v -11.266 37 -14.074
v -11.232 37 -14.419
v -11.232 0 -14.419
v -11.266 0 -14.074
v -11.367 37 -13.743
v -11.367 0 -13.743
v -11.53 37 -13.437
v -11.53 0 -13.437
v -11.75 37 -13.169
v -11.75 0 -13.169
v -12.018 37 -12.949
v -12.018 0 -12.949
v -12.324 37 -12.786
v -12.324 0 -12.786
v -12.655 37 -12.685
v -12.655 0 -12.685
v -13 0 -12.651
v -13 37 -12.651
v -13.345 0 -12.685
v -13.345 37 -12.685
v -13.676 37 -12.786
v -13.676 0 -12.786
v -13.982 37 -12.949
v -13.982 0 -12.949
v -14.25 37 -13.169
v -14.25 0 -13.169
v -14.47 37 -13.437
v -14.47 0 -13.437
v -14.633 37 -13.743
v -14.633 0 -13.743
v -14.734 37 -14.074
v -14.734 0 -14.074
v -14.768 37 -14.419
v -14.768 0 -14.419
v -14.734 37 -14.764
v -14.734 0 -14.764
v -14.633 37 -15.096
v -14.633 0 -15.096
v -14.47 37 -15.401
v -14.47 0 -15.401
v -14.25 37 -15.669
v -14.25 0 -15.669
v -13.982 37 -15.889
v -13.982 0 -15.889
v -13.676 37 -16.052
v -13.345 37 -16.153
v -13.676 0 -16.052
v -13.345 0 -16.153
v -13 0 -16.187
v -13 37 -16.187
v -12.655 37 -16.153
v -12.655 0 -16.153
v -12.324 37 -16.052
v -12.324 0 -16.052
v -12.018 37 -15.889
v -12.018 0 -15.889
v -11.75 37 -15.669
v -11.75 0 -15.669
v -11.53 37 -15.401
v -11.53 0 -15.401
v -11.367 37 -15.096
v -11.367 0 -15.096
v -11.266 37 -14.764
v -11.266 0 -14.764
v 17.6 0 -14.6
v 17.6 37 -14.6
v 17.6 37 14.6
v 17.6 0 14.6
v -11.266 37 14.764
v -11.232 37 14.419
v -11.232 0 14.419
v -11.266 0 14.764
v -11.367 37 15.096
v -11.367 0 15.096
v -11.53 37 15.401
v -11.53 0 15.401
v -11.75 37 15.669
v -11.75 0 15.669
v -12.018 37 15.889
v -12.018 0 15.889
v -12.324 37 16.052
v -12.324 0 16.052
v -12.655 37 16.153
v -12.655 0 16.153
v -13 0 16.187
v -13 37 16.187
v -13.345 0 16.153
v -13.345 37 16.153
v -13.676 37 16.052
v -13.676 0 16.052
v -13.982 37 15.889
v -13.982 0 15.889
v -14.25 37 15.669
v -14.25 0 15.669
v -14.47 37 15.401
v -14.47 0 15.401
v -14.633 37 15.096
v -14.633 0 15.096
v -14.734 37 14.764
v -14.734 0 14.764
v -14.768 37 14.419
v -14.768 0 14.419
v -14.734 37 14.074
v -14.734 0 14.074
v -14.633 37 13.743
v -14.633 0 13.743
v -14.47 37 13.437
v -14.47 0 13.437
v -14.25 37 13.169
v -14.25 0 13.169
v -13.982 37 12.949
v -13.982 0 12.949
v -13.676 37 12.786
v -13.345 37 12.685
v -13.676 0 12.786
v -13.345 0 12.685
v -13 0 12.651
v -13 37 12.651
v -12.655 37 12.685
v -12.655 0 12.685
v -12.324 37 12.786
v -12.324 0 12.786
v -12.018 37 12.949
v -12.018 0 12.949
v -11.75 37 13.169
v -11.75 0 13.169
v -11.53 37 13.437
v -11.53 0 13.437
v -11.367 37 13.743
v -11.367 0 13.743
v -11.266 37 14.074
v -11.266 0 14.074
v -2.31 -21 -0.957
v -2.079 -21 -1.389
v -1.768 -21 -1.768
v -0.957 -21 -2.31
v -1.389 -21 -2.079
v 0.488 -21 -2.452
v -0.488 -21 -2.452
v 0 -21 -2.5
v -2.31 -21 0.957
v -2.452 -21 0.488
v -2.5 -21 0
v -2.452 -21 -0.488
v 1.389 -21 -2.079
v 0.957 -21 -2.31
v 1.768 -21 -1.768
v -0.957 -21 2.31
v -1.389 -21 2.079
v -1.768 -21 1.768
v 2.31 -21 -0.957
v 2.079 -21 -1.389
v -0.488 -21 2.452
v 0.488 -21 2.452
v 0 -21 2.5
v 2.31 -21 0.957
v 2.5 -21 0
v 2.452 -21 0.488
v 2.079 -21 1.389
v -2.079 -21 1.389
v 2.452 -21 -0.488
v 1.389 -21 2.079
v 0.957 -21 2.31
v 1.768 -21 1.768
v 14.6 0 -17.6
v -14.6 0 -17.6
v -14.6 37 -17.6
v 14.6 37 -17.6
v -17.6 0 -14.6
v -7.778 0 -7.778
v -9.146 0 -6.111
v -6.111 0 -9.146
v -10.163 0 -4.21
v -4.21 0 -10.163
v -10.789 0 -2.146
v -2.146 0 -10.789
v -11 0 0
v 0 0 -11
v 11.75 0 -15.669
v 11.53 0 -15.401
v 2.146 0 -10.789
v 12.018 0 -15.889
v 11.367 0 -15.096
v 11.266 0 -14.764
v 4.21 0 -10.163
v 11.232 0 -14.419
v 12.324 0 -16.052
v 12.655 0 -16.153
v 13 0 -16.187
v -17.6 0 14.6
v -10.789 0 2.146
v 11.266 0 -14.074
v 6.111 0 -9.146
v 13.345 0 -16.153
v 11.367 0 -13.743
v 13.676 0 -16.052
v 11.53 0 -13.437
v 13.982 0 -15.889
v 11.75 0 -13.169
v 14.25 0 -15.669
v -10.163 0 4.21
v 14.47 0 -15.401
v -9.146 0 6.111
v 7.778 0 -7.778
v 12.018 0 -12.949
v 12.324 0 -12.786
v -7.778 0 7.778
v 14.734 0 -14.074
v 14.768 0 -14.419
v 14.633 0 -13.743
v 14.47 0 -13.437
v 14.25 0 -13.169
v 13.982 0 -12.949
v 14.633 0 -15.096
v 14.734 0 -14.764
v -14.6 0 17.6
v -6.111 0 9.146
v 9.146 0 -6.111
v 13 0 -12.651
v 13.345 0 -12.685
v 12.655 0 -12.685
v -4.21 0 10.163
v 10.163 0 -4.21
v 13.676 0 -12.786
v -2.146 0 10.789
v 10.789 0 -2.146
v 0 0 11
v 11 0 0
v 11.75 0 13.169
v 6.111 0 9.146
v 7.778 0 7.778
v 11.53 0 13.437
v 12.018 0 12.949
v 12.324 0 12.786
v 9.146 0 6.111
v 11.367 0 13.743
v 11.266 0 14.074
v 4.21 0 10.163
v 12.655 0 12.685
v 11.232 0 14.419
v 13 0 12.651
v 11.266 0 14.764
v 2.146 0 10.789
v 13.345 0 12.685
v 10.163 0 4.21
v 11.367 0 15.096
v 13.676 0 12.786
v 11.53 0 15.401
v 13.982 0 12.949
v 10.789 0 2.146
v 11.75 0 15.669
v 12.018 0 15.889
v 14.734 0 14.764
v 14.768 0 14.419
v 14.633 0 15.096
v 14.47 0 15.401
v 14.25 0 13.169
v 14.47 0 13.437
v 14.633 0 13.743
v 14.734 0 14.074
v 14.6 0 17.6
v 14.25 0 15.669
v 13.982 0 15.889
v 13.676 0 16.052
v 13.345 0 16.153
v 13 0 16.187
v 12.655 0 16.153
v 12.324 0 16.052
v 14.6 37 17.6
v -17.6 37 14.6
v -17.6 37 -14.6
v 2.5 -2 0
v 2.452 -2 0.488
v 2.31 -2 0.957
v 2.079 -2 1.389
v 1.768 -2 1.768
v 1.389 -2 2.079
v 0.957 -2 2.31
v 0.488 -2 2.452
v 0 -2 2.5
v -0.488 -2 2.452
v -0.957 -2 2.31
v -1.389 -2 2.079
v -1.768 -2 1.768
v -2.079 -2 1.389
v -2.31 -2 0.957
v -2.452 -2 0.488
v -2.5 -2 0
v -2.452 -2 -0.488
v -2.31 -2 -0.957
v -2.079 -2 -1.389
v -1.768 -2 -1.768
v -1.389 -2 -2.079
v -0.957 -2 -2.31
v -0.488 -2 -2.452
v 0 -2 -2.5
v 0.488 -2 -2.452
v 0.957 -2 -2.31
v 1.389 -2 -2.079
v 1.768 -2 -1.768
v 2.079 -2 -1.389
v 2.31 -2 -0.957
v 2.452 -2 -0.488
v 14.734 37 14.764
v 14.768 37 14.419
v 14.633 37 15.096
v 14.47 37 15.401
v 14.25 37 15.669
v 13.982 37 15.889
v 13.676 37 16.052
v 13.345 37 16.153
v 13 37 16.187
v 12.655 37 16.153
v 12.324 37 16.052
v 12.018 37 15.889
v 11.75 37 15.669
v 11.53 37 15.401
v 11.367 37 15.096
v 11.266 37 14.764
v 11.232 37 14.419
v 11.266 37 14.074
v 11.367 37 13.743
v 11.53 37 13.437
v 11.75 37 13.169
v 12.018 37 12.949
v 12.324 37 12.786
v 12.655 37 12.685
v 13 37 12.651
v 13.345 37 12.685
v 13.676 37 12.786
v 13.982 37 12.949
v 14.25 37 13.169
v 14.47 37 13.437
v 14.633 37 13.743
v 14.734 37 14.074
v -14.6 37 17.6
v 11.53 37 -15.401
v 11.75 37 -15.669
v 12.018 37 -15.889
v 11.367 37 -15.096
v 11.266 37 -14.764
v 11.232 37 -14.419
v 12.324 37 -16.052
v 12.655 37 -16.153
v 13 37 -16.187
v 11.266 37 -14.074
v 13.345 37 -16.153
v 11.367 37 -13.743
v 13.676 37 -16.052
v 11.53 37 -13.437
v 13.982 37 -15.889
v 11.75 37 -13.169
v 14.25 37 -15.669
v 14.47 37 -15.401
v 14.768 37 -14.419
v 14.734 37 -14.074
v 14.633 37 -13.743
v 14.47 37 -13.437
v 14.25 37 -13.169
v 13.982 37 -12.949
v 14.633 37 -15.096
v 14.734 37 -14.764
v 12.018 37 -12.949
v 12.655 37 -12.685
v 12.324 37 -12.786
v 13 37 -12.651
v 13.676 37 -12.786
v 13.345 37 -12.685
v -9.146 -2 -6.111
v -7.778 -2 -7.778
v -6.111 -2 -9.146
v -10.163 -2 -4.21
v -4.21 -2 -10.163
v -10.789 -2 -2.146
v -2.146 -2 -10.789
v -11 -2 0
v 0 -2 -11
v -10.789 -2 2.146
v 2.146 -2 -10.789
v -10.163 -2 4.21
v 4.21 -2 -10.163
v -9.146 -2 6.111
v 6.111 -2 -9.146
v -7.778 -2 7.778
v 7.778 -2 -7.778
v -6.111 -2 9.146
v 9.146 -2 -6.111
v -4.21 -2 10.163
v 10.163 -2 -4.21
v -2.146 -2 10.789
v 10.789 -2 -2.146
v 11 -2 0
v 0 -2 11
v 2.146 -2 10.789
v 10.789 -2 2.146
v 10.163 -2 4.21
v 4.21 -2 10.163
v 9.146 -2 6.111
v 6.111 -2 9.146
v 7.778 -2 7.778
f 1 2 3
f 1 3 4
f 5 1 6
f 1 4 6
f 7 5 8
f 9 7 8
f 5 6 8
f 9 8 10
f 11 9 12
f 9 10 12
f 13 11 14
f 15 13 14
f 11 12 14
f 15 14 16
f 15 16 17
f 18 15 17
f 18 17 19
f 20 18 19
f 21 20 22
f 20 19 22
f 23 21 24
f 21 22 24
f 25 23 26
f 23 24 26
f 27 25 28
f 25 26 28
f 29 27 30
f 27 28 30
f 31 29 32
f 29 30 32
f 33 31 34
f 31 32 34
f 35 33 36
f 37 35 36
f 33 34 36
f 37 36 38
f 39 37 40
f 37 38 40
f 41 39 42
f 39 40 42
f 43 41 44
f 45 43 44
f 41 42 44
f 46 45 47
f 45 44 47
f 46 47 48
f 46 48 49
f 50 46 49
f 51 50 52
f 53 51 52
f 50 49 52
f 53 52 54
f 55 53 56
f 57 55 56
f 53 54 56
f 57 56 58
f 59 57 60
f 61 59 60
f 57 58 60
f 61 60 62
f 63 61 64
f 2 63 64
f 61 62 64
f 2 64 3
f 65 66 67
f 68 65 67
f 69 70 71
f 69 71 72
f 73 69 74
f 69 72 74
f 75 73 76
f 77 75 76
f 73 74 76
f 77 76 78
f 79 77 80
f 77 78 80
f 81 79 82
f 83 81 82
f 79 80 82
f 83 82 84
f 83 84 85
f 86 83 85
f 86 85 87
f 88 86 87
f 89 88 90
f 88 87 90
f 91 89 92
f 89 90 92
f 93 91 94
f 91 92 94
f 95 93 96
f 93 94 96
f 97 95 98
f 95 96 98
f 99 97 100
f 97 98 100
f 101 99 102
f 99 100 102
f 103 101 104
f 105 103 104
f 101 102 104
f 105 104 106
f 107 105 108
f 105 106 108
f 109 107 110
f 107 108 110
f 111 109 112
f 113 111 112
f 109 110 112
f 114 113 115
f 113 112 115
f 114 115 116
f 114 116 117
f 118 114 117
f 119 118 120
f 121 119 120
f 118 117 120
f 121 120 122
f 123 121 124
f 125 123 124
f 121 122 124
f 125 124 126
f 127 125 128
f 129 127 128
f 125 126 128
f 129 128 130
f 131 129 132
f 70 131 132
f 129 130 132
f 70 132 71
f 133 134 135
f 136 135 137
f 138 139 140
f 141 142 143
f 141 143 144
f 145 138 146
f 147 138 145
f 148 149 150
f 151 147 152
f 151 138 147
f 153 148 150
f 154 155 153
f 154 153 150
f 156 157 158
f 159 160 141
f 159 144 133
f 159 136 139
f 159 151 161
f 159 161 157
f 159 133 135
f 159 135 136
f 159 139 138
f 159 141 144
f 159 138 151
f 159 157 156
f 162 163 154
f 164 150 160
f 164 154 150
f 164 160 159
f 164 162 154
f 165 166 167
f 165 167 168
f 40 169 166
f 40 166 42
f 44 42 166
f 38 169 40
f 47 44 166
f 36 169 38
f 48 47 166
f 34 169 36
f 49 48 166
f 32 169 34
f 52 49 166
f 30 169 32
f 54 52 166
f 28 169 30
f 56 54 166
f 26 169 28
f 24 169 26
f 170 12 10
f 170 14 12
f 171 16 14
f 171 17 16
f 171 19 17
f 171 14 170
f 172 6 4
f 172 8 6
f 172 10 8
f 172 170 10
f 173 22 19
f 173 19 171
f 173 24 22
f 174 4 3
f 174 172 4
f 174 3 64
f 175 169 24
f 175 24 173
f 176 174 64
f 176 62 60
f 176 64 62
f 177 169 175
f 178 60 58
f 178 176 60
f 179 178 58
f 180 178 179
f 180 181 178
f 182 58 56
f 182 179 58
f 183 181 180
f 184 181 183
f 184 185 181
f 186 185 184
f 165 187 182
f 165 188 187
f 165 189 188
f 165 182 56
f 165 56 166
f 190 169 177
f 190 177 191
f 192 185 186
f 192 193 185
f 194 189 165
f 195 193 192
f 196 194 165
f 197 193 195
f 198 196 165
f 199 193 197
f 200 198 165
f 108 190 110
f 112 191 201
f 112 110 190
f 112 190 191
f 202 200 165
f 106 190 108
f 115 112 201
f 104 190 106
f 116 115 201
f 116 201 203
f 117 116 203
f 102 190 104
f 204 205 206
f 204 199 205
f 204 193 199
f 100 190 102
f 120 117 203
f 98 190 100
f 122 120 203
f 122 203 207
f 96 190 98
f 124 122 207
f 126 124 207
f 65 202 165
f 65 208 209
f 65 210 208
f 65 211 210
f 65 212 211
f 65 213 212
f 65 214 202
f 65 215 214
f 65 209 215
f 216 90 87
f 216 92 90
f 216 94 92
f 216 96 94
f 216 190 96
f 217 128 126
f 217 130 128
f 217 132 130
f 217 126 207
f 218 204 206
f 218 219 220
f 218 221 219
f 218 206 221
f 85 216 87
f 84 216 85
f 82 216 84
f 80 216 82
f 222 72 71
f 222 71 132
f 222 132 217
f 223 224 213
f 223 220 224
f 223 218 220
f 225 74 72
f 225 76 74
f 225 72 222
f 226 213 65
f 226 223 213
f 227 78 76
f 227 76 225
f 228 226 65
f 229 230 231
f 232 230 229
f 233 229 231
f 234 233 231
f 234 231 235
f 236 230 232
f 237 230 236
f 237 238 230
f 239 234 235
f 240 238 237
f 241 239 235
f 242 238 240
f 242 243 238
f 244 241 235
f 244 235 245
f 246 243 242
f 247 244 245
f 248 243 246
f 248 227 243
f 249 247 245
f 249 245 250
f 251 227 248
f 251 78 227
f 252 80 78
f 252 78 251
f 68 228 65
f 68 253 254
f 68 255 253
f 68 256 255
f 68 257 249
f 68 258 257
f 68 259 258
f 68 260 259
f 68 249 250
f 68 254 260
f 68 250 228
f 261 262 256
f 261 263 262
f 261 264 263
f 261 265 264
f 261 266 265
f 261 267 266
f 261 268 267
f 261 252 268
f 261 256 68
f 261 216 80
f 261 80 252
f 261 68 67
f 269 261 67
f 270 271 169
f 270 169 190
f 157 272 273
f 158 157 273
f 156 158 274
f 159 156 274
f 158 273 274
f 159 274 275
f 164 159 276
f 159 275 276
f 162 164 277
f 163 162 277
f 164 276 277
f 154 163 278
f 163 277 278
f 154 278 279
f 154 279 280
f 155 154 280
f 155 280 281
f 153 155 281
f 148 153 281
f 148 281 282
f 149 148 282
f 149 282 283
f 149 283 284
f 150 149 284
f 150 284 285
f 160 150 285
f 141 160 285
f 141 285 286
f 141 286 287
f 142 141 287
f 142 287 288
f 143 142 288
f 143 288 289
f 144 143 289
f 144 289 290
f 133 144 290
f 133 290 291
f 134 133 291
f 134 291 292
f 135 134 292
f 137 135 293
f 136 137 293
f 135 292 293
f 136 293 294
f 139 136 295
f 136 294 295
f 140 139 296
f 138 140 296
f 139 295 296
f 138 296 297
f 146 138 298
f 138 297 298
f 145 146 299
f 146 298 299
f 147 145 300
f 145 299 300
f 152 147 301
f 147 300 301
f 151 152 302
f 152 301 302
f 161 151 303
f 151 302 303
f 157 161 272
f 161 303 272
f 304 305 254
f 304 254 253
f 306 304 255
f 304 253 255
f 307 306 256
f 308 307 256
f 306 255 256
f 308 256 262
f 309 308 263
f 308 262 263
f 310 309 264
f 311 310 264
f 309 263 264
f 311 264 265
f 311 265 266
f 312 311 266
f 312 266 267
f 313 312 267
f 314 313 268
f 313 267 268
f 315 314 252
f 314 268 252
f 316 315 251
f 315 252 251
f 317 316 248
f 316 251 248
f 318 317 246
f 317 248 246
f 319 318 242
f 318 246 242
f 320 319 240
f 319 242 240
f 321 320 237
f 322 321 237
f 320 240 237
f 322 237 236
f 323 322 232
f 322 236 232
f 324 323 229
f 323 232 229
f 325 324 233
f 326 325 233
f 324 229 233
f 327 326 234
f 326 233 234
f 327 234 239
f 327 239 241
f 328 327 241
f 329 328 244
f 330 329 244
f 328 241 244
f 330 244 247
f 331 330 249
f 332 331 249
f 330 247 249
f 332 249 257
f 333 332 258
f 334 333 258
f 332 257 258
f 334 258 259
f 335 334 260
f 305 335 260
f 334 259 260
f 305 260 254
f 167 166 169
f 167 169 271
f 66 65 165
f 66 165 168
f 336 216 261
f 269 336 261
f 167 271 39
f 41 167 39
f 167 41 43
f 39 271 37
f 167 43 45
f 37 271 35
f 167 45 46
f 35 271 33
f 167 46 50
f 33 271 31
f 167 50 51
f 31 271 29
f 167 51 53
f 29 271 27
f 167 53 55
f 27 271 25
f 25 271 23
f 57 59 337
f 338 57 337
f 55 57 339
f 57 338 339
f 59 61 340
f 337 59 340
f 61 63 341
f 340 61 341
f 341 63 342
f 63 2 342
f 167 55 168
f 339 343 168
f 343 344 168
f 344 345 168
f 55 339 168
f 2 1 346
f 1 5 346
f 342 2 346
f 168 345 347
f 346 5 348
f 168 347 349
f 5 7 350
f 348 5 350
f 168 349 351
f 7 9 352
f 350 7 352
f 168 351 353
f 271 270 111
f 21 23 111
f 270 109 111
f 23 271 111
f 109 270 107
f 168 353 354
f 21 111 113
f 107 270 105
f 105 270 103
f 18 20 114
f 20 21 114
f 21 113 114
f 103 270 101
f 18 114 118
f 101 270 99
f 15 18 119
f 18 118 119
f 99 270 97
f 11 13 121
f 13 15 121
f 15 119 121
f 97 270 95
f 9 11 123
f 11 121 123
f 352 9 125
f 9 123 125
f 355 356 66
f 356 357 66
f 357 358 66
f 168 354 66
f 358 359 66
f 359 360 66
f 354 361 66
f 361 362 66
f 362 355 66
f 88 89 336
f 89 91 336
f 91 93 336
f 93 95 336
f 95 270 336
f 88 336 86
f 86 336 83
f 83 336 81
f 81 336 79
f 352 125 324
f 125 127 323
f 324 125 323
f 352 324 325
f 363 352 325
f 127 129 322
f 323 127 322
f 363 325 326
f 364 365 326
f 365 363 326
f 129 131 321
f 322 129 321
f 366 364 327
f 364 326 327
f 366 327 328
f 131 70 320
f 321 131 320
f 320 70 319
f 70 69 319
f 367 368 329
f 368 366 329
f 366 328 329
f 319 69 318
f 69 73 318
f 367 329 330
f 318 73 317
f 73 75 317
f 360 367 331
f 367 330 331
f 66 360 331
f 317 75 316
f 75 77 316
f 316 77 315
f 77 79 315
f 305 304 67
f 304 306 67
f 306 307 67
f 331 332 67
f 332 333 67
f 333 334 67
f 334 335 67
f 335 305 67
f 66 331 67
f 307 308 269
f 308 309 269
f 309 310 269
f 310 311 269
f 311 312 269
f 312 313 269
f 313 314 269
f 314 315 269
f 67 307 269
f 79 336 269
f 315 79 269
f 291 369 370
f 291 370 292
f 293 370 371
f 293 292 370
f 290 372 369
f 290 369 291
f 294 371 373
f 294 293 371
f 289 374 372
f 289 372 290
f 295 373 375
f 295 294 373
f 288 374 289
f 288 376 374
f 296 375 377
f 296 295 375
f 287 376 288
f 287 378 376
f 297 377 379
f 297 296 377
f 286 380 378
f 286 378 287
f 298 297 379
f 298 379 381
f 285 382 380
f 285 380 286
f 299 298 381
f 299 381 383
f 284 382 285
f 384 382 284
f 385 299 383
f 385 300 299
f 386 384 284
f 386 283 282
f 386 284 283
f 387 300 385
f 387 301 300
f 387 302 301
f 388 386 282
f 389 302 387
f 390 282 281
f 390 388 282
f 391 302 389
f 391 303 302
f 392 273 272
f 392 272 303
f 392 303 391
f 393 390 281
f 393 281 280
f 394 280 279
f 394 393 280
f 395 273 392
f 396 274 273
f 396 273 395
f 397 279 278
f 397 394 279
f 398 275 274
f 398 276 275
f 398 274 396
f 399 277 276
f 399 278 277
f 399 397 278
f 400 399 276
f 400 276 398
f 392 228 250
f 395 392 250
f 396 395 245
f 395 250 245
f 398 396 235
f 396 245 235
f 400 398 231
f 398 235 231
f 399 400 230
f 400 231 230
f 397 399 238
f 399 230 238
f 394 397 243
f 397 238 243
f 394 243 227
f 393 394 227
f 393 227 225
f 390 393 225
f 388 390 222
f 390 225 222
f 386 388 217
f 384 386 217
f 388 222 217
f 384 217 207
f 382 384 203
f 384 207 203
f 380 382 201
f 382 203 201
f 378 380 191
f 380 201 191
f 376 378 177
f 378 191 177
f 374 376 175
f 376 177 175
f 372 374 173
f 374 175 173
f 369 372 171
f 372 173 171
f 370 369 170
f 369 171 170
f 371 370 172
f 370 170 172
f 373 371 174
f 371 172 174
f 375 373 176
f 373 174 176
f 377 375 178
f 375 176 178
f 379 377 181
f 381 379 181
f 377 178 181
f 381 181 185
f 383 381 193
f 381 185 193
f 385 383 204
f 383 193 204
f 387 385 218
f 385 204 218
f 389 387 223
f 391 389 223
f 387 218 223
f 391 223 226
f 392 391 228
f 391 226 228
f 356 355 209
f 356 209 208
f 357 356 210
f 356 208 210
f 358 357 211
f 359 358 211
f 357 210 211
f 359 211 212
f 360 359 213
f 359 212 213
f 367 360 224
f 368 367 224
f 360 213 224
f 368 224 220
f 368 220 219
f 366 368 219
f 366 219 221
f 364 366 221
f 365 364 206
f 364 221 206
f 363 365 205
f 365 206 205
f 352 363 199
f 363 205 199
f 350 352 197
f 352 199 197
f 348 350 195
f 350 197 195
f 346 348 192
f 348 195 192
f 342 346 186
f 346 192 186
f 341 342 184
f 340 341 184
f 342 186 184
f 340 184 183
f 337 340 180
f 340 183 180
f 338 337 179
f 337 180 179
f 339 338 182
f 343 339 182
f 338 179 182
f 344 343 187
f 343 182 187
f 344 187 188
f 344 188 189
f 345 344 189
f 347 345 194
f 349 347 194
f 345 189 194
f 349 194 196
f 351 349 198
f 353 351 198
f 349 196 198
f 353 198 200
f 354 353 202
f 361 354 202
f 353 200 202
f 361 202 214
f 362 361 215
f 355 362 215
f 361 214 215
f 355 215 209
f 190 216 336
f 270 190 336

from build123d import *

# Parameters (mm, degrees)
F0_W     = 35.2
F0_H     = 35.200004
F0_R     = 1.767695
F0_R_2   = 11
F0_R_3   = 2.5
F1_DEPTH = 37
F2_DEPTH = 2
F3_DEPTH = 21
F4_SIZE  = 3


with BuildPart() as f1:
    # F0 (on Front) → F1 (new body)
    with BuildSketch(Plane.XZ):
        Rectangle(F0_W, F0_H)
        with Locations((-13, -14.419172)):
            Circle(F0_R, mode=Mode.SUBTRACT)
        with Locations((13, -14.419172)):
            Circle(F0_R, mode=Mode.SUBTRACT)
        with Locations((-13, 14.419172)):
            Circle(F0_R, mode=Mode.SUBTRACT)
        Circle(F0_R_2, mode=Mode.SUBTRACT)
        with Locations((13, 14.419172)):
            Circle(F0_R, mode=Mode.SUBTRACT)
        Circle(F0_R_2)
        Circle(F0_R_3, mode=Mode.SUBTRACT)
        Circle(F0_R_3)
    extrude(amount=-F1_DEPTH)

    # F0 (on Front) → F2 (join)
    with BuildSketch(Plane.XZ):
        Circle(F0_R_2)
        Circle(F0_R_3, mode=Mode.SUBTRACT)
    extrude(amount=F2_DEPTH)

    # F0 (on Front) → F3 (join)
    with BuildSketch(Plane.XZ):
        Circle(F0_R_3)
    extrude(amount=F3_DEPTH)

    # F4
    f4_edges = [f1.edges().sort_by_distance(p)[0] for p in [
        (17.6, 18.5, 17.600002),
        (-17.6, 18.5, 17.600002),
        (17.6, 18.5, -17.600002),
        (-17.6, 18.5, -17.600002),
    ]]
    chamfer(f4_edges, length=F4_SIZE)


solid = f1.part
